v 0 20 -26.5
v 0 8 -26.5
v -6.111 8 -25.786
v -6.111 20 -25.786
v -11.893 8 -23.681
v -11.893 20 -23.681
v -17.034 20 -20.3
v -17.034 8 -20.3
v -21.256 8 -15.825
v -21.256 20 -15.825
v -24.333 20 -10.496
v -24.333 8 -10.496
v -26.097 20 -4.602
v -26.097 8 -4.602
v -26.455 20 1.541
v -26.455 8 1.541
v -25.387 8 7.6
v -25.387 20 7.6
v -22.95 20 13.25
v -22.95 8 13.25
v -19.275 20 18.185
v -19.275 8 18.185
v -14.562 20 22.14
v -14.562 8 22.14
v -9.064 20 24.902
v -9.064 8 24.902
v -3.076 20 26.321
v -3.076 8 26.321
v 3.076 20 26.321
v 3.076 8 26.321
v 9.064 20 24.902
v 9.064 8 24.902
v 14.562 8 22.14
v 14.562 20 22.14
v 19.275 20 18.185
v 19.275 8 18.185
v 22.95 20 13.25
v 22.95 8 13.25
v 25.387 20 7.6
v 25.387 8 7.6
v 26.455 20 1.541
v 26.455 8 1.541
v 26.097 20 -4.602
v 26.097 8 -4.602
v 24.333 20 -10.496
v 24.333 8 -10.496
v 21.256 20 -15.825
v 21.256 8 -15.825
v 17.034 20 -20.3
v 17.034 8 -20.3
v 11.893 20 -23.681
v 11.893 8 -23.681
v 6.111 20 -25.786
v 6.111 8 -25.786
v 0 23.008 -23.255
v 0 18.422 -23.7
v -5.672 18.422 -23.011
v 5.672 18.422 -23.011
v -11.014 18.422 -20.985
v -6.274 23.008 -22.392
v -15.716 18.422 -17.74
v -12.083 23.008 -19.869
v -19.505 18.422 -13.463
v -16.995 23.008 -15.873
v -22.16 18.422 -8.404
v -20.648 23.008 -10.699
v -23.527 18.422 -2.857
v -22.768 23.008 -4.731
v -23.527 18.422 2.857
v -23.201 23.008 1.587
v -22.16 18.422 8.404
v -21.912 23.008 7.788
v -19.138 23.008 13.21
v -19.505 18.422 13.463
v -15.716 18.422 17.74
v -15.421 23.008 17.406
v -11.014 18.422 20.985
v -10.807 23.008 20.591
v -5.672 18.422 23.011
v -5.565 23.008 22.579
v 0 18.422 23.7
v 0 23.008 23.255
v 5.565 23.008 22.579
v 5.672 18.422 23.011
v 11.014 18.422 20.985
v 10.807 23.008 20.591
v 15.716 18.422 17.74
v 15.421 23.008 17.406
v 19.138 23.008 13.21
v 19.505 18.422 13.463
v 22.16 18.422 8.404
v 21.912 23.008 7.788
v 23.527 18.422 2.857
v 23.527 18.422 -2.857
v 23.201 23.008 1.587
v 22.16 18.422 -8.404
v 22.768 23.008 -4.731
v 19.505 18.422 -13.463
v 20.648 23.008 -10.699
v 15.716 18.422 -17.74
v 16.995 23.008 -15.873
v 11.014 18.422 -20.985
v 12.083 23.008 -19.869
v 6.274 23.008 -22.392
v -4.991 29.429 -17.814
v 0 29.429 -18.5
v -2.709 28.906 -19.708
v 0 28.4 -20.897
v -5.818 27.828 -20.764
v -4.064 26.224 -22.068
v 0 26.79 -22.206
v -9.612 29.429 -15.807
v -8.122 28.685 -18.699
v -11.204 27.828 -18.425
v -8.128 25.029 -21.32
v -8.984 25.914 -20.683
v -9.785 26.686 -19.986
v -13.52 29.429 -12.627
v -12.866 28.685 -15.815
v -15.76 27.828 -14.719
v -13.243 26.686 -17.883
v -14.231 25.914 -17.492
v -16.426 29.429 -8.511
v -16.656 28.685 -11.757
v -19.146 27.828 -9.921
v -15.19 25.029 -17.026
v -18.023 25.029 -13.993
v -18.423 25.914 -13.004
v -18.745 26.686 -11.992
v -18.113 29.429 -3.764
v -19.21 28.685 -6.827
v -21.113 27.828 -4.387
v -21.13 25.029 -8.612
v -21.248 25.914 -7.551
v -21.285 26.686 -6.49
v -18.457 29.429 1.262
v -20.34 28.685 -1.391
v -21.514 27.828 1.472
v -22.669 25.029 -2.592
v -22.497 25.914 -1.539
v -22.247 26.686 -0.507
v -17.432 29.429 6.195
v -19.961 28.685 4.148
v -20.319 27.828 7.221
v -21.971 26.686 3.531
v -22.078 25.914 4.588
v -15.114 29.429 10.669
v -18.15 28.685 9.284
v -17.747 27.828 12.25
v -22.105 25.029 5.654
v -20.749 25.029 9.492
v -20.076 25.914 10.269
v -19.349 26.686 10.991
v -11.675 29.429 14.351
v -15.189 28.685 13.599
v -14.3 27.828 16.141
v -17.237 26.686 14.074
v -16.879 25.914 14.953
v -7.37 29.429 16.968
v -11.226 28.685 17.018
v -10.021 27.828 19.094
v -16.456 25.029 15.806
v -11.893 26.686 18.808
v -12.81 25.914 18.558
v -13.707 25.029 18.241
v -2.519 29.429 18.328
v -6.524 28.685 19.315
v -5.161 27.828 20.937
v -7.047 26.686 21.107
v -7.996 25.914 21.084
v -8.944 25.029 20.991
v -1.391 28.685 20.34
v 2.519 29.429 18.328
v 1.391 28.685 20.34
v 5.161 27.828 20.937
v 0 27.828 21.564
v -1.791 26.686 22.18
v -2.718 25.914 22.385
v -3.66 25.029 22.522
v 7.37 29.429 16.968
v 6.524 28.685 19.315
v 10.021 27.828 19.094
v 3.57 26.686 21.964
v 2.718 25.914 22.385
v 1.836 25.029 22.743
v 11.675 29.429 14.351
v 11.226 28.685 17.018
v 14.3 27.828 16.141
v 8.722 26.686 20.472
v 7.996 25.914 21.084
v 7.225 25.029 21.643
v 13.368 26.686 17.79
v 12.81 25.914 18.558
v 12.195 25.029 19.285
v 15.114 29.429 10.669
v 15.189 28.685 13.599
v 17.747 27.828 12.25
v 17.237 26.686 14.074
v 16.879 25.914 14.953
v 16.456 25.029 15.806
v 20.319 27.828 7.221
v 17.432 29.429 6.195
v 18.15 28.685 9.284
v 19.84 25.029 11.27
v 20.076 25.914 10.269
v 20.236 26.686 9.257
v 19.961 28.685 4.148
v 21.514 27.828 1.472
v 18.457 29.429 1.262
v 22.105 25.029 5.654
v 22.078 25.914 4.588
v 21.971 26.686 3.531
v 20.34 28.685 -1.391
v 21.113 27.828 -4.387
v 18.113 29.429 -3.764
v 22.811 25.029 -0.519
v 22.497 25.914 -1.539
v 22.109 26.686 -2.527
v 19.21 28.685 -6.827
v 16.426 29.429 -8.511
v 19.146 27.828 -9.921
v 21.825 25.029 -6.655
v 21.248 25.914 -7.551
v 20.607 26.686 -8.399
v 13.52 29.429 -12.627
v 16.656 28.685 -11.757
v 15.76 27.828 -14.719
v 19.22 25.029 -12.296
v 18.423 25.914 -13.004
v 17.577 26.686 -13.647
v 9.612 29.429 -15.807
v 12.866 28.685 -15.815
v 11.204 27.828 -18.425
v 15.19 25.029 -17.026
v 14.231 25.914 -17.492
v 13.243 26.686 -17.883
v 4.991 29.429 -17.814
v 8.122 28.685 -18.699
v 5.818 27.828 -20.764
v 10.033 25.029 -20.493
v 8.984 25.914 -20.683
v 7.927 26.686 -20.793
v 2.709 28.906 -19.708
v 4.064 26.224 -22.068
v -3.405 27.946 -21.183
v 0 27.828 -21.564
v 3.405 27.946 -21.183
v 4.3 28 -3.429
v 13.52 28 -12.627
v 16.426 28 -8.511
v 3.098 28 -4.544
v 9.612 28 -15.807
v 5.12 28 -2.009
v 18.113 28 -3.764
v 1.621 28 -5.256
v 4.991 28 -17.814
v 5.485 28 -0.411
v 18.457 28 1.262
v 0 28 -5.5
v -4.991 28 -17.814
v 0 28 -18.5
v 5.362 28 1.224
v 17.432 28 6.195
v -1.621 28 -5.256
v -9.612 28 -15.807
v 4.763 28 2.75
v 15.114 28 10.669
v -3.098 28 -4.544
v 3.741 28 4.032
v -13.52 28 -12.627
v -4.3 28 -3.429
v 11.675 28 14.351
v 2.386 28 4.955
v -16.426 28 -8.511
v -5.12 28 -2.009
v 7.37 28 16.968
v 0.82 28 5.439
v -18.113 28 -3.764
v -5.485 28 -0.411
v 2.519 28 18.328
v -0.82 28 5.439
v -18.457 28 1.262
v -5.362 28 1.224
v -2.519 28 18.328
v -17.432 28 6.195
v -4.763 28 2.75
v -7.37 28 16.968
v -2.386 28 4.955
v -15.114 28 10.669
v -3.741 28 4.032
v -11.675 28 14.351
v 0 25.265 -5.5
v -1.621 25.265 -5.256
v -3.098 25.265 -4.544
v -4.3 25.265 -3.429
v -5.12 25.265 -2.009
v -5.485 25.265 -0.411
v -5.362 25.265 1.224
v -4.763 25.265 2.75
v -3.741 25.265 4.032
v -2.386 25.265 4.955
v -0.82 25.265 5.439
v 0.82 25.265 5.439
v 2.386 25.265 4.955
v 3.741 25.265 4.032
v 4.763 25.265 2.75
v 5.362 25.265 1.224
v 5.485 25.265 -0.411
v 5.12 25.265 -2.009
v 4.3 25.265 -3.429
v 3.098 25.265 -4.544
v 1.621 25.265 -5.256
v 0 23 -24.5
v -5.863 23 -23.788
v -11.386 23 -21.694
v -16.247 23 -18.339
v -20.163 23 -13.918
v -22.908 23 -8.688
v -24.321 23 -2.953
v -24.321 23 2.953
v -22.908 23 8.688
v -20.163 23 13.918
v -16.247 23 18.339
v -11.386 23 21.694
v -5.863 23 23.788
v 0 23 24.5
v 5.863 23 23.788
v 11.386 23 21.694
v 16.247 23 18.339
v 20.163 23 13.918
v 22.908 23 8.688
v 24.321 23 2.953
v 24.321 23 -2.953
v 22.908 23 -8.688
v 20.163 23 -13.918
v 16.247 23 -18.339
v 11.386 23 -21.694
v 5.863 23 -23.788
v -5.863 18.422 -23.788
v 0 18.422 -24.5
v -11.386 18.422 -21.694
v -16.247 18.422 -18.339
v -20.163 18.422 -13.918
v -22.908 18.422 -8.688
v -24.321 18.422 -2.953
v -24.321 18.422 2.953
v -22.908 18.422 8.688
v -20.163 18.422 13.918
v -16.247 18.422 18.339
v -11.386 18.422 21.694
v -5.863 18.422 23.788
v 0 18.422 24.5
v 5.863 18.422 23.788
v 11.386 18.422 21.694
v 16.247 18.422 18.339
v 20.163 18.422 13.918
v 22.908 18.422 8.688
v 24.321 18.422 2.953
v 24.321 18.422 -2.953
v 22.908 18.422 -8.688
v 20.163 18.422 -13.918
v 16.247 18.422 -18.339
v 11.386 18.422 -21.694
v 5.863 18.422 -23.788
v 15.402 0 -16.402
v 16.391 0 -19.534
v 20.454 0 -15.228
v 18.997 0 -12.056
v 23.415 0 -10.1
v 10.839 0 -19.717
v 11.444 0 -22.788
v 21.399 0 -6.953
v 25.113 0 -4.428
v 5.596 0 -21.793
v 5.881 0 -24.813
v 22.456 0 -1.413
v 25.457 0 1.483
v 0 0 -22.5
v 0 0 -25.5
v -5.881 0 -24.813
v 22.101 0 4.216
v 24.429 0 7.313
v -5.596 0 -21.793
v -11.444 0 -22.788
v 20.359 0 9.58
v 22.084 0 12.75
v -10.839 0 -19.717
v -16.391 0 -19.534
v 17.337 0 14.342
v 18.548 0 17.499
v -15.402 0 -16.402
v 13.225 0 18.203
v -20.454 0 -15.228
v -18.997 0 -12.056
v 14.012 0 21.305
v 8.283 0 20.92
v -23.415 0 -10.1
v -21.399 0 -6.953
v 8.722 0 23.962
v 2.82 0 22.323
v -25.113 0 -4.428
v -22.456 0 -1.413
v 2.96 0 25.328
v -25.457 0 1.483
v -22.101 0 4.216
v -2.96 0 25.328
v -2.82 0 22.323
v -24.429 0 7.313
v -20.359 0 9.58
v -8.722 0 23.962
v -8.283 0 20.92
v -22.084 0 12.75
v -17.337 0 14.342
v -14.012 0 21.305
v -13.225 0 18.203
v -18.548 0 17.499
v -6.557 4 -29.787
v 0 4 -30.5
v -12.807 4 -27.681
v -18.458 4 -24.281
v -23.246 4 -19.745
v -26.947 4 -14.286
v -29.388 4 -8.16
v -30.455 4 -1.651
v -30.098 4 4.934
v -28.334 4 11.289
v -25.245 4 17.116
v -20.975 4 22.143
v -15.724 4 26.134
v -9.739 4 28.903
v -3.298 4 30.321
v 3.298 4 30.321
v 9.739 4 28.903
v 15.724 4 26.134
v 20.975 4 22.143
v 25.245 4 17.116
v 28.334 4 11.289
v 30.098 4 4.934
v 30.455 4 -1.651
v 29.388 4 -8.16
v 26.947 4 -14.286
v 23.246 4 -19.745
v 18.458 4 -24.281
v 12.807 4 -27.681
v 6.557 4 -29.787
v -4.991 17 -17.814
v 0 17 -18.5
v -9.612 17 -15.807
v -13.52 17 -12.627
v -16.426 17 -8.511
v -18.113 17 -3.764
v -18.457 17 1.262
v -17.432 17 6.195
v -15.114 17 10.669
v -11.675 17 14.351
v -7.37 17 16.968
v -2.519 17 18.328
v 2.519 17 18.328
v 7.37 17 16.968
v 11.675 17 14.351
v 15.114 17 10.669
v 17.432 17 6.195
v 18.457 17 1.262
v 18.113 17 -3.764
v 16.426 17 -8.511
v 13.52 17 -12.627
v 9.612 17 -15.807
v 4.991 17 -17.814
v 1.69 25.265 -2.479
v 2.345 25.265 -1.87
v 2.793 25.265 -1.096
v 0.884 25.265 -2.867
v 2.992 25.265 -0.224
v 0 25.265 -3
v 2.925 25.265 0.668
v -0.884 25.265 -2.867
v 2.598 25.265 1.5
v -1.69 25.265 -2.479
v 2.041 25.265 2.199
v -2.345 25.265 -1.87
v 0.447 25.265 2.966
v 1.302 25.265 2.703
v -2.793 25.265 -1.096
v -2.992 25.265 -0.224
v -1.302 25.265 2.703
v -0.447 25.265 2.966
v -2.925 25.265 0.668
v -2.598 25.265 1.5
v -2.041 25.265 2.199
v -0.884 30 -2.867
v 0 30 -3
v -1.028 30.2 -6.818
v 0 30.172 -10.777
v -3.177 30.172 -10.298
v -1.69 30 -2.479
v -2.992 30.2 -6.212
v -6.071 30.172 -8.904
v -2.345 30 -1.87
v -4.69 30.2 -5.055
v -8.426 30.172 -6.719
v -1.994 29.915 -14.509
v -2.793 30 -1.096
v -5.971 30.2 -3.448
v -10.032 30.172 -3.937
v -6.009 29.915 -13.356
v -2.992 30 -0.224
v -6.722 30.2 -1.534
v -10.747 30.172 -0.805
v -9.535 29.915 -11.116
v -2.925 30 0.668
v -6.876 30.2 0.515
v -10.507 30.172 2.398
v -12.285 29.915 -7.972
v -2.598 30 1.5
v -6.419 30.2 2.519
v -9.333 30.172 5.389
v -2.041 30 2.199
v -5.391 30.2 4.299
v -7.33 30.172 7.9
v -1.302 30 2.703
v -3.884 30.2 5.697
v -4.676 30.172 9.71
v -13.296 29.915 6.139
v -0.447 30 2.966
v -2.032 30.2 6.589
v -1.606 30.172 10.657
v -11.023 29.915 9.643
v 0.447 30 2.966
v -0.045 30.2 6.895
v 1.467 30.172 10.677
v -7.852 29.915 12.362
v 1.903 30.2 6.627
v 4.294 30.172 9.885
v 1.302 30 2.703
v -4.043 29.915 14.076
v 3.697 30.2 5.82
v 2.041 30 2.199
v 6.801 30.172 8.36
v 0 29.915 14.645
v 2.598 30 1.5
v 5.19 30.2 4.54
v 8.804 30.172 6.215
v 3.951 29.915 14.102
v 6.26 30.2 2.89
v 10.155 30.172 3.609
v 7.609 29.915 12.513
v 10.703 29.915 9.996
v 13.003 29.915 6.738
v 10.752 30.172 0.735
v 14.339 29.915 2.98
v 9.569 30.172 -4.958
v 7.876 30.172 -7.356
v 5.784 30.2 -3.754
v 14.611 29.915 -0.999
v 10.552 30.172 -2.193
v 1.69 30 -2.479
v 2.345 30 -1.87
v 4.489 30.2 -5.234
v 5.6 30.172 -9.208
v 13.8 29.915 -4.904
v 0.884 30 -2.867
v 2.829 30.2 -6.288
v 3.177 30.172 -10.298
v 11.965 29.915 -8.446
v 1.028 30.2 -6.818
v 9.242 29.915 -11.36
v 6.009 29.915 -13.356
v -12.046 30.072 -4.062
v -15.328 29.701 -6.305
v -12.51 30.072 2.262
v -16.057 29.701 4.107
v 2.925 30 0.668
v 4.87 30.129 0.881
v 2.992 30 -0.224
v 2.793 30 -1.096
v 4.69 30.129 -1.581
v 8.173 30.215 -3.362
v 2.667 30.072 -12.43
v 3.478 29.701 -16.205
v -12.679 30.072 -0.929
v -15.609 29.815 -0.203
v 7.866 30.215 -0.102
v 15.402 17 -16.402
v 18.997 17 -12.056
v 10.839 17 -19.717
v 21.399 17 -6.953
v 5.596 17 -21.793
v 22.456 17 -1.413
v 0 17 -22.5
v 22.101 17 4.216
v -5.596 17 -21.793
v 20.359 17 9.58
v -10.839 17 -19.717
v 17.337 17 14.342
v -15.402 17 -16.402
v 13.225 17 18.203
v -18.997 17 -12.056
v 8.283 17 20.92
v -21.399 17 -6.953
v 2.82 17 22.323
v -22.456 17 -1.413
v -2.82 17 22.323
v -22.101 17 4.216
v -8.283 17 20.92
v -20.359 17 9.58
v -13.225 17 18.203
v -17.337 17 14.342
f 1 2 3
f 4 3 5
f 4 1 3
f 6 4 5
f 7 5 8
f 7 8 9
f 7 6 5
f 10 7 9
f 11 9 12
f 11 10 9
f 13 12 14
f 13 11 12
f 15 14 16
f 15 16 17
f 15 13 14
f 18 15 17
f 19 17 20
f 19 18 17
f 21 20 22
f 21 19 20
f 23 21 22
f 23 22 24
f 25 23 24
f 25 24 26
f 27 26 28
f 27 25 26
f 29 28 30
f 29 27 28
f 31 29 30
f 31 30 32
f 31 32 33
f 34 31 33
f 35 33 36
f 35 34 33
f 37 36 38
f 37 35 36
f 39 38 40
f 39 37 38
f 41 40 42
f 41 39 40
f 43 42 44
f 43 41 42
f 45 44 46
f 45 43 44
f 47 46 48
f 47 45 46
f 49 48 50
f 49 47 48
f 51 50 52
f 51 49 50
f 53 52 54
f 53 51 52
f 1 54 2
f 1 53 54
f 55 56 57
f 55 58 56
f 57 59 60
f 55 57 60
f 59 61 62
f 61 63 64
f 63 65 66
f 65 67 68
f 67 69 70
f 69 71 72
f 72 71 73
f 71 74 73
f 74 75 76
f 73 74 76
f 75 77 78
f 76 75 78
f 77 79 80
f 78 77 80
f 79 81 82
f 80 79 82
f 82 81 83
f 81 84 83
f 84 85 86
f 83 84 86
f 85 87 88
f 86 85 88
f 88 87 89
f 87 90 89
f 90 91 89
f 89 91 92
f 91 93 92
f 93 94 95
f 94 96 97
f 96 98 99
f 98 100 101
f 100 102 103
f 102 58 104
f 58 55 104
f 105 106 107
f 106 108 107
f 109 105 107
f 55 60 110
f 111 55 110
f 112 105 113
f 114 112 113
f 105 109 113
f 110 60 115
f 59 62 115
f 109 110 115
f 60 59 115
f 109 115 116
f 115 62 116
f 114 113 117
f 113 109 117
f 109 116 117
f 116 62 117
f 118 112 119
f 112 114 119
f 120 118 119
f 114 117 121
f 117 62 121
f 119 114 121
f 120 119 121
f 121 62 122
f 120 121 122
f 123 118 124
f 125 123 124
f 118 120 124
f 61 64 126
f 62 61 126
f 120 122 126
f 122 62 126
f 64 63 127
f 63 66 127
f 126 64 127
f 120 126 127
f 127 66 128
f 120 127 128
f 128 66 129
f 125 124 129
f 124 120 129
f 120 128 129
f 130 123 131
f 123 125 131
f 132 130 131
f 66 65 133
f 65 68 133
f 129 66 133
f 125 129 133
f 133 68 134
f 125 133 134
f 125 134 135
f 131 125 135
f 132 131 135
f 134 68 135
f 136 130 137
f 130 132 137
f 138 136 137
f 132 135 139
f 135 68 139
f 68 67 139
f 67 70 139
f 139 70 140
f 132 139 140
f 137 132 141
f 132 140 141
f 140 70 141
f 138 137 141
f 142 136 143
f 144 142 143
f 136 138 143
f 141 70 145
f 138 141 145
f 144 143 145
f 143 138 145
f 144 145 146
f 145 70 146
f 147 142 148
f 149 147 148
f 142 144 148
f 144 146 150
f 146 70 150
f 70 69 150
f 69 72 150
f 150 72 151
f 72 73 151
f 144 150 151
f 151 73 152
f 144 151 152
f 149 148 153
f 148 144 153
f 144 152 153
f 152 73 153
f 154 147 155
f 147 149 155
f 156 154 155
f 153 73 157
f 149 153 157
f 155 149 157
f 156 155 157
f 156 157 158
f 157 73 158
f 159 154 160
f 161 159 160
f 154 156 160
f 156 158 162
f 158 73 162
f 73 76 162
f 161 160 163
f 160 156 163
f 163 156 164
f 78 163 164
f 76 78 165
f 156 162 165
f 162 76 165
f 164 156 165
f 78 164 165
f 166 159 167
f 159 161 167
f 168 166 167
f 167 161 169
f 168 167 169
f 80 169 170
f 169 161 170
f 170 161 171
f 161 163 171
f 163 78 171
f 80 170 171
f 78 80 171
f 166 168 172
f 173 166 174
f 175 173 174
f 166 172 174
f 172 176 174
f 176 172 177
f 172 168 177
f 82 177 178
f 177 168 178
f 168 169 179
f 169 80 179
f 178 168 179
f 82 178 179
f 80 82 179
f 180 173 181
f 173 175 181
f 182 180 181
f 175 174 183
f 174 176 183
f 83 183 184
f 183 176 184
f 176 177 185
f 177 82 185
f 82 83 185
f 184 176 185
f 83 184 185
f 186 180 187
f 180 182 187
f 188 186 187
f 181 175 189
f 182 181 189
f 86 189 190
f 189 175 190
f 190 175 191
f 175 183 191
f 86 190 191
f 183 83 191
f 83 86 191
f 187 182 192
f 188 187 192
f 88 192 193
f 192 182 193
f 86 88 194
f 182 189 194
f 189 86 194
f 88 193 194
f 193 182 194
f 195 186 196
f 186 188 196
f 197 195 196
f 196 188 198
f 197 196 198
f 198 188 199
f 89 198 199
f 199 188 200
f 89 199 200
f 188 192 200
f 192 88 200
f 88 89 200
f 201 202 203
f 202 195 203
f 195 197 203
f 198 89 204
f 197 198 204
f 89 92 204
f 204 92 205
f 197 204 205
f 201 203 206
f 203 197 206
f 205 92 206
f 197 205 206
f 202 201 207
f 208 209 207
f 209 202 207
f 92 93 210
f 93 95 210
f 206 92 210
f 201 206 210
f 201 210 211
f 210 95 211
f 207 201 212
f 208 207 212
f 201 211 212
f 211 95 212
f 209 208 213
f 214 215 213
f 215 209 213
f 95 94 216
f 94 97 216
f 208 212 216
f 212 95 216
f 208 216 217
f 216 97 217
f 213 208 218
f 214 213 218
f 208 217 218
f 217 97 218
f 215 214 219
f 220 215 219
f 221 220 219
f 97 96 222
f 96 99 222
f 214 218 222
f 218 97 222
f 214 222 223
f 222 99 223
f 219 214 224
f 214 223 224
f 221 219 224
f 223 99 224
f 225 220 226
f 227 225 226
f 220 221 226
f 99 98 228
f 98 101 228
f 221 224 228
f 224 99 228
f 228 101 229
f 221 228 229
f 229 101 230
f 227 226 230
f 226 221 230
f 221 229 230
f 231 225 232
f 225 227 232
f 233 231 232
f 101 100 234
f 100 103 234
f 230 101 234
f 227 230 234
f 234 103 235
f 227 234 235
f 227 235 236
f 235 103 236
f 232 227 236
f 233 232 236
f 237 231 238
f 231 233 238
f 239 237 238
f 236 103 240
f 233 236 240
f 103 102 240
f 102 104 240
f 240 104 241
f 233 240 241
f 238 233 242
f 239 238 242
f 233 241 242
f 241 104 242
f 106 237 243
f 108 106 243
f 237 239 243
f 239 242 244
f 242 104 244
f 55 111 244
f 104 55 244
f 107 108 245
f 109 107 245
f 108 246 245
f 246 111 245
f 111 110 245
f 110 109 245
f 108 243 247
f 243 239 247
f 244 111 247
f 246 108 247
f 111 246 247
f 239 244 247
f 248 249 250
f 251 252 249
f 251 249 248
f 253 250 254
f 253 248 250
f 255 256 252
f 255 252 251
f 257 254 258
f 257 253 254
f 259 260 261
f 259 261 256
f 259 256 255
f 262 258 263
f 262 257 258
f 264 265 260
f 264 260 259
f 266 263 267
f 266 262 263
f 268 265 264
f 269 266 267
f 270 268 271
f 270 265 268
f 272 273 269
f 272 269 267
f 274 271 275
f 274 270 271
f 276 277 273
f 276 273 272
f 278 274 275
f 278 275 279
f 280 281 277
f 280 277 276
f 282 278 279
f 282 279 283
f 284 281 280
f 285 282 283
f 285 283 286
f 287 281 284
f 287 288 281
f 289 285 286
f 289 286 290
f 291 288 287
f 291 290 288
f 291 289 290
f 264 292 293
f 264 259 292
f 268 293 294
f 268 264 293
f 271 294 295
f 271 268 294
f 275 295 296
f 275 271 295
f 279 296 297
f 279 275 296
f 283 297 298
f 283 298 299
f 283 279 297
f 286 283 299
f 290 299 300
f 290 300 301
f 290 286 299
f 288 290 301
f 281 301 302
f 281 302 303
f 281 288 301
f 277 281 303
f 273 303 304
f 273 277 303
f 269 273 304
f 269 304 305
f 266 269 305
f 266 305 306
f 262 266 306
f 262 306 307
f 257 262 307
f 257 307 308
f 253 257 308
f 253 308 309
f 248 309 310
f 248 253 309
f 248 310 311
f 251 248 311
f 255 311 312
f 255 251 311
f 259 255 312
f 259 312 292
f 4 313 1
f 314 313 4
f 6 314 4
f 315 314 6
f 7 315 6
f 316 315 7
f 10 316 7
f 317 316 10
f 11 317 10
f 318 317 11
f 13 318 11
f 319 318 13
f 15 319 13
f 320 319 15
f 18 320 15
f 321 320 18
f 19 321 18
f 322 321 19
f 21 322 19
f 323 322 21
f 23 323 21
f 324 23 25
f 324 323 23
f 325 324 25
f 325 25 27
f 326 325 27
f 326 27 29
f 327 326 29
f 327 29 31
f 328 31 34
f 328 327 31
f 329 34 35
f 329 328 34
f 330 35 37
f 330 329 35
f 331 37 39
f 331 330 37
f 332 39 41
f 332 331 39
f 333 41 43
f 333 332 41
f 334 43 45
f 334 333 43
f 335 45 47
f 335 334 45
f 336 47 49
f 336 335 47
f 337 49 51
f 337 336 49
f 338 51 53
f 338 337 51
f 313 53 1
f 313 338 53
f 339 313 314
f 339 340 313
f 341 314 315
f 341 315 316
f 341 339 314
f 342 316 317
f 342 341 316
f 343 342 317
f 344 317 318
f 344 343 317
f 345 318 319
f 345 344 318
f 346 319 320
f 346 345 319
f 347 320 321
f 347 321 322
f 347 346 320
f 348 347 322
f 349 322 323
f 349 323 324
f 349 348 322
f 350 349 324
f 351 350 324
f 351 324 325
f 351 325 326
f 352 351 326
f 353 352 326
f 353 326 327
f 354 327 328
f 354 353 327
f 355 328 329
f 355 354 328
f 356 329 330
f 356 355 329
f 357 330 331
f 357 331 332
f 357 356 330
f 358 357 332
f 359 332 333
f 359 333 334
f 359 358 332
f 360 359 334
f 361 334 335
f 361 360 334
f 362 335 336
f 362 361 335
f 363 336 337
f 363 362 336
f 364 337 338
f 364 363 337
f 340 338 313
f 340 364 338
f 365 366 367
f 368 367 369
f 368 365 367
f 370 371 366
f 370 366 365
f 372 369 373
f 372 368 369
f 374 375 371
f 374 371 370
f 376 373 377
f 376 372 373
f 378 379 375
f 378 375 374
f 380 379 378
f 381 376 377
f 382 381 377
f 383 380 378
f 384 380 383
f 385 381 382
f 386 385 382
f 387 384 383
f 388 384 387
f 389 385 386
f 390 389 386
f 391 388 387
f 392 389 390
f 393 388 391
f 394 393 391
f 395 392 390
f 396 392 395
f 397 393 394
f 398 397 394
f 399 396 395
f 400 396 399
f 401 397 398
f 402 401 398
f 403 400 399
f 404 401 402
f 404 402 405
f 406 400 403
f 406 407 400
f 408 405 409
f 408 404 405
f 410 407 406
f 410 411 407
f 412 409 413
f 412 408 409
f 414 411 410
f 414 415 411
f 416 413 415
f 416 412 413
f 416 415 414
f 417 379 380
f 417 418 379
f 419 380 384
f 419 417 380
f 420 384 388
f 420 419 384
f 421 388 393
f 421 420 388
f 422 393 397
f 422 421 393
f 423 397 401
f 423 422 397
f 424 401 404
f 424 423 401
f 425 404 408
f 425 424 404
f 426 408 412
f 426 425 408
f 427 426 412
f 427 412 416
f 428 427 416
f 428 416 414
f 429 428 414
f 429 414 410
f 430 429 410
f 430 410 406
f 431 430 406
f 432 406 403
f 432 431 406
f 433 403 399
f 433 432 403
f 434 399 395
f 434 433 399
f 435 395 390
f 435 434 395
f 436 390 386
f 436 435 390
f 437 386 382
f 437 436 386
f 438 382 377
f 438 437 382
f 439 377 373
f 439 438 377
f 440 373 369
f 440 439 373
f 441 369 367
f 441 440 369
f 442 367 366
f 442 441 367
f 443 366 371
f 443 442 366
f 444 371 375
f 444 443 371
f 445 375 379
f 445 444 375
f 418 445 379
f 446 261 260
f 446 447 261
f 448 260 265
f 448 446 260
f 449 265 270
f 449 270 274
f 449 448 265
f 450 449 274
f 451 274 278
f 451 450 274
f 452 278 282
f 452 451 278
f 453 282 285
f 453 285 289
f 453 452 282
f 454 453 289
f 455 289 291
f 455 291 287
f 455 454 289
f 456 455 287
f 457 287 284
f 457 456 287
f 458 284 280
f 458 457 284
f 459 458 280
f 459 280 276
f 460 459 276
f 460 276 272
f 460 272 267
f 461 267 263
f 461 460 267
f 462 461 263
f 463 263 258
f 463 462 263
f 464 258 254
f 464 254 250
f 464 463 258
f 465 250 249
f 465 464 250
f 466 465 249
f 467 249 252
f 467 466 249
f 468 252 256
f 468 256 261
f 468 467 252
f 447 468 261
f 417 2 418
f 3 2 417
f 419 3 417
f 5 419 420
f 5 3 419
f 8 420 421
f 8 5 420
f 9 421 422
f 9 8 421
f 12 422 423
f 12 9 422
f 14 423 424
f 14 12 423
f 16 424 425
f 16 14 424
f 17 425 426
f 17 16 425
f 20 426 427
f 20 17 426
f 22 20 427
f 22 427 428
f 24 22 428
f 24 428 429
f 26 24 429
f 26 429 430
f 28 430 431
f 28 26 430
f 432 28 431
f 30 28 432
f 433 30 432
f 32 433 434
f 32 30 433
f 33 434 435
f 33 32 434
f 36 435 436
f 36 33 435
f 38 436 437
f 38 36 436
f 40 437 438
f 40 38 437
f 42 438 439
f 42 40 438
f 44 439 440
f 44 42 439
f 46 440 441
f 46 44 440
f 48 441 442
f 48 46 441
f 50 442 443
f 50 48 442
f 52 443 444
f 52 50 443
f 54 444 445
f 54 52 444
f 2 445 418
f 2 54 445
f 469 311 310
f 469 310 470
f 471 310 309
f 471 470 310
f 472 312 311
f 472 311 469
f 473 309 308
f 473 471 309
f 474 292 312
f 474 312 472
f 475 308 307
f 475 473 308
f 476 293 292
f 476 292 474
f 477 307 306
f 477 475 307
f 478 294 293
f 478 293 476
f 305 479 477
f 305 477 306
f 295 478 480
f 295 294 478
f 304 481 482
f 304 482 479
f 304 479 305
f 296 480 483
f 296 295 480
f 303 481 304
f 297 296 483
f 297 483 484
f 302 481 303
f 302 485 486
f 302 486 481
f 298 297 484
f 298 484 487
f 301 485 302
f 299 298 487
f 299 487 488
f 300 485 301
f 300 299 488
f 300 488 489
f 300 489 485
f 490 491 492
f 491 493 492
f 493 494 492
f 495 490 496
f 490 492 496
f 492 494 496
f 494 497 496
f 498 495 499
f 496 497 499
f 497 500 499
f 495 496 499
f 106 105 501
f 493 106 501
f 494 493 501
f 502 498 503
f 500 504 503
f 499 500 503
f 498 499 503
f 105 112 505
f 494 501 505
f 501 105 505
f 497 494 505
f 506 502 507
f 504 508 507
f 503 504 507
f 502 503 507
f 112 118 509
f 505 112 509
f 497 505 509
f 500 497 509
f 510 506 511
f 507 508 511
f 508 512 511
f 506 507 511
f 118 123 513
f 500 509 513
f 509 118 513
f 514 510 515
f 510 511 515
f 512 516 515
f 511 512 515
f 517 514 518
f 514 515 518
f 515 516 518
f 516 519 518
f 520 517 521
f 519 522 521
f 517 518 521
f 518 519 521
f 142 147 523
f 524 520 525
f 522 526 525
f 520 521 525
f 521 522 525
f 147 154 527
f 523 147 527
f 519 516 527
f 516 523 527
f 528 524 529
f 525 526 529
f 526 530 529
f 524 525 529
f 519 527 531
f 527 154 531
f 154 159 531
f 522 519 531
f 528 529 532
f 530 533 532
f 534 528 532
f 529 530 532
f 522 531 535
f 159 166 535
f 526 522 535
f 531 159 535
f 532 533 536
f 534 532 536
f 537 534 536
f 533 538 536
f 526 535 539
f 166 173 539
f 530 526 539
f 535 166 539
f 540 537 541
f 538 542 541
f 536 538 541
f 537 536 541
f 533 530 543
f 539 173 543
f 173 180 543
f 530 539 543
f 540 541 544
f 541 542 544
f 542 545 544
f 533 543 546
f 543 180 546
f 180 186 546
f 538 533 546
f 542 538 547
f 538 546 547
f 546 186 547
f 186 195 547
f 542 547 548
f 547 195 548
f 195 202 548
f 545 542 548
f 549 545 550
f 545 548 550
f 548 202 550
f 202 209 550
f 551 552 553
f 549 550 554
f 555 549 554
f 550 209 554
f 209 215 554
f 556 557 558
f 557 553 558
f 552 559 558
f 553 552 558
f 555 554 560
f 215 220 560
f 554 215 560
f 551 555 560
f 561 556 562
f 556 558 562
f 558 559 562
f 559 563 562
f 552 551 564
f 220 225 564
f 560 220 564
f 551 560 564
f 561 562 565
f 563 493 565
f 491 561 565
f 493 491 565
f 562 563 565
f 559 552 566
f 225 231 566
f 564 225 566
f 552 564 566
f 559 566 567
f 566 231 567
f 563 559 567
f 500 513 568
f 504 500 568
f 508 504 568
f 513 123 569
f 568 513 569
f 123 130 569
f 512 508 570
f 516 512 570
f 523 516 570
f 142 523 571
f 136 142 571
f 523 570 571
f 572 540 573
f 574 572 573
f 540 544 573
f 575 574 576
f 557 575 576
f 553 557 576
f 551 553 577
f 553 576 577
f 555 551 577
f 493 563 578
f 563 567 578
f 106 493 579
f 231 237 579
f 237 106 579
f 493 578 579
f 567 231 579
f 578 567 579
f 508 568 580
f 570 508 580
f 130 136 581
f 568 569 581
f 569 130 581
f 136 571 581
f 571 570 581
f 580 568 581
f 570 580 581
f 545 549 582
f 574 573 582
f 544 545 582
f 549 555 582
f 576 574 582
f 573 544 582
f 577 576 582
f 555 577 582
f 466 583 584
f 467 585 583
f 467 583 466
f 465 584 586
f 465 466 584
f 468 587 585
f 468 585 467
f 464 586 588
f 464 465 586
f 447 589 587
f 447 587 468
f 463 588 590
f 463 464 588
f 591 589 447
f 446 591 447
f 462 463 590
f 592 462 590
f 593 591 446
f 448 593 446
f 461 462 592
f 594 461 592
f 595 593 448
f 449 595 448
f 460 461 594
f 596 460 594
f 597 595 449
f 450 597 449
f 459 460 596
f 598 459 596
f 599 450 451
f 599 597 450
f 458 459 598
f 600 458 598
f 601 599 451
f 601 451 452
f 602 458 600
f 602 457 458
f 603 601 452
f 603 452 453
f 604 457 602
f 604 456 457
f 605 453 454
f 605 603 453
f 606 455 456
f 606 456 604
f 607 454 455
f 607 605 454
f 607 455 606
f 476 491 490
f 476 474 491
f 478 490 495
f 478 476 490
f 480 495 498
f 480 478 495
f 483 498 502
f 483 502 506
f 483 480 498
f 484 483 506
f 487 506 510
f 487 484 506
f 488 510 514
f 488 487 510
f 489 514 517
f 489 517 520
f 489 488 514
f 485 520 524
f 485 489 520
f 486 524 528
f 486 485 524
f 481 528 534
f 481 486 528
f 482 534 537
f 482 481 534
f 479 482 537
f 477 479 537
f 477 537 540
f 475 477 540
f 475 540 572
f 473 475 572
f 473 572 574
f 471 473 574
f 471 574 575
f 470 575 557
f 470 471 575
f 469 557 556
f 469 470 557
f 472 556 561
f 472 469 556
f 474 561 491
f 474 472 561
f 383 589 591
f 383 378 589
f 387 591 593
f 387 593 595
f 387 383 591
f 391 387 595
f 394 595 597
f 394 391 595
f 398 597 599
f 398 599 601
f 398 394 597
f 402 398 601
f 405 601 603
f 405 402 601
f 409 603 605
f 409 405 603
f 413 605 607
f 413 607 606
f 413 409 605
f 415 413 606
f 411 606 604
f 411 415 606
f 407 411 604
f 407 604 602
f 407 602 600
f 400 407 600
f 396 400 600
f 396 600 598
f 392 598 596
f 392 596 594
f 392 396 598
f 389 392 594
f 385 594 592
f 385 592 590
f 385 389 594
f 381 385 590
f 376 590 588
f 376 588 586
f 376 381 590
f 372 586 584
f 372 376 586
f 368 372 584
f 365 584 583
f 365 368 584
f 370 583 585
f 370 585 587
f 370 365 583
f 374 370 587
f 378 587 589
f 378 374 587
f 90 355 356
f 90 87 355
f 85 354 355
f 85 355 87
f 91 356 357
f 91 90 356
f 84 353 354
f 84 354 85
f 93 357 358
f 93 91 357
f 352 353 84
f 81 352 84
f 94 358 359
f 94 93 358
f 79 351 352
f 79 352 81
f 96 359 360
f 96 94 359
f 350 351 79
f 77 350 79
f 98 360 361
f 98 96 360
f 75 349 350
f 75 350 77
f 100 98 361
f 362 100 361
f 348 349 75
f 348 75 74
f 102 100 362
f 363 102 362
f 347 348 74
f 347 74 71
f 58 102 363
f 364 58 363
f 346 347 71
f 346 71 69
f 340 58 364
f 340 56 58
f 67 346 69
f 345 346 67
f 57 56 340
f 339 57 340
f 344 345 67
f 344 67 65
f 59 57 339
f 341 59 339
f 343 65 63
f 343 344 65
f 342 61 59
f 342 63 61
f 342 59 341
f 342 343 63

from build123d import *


with BuildPart() as part:
    # 草图1 → 旋转1 (revolve)
    with BuildSketch(Plane.XY, mode=Mode.PRIVATE) as revolve_1_sk:
        with BuildLine():
            add(Edge.make_bspline(
                [(3, 30), (10.804022891, 30.629123292), (18.5, 29.429304071)],
                knots=[0, 0, 0, 1, 1, 1], degree=2))
            Line((3, 30), (3, 25.264976959))
            Line((3, 25.264976959), (5.5, 25.264976959))
            Line((5.5, 25.264976959), (5.5, 28))
            Line((5.5, 28), (18.5, 28))
            Line((18.5, 28), (18.5, 17))
            Line((18.5, 17), (22.5, 17))
            Line((22.5, 17), (22.5, 0))
            Line((22.5, 0), (25.5, 0))
            Line((25.5, 0), (30.5, 4))
            Line((30.5, 4), (26.5, 8))
            Line((26.5, 8), (26.5, 20))
            Line((26.5, 20), (24.5, 23))
            Line((24.5, 23), (24.5, 18.421658986))
            Line((24.5, 18.421658986), (23.7, 18.421658986))
            add(Edge.make_bspline(
                [(18.5, 29.429304071), (20.511937278, 28.706105263), (22.57806562, 27.932491859), (23.627012252, 21.580564191), (23.7, 18.421658986)],
                knots=[0, 0, 0, 0, 0.382453264, 0.927890023, 0.927890023, 0.927890023, 0.927890023], degree=3))
        make_face()
    revolve(revolve_1_sk.sketch.rotate(Axis((0, 0, 0), (0, 1, 0)), 90), axis=Axis((0, 0, 0), (0, 1, 0)))


solid = part.part
